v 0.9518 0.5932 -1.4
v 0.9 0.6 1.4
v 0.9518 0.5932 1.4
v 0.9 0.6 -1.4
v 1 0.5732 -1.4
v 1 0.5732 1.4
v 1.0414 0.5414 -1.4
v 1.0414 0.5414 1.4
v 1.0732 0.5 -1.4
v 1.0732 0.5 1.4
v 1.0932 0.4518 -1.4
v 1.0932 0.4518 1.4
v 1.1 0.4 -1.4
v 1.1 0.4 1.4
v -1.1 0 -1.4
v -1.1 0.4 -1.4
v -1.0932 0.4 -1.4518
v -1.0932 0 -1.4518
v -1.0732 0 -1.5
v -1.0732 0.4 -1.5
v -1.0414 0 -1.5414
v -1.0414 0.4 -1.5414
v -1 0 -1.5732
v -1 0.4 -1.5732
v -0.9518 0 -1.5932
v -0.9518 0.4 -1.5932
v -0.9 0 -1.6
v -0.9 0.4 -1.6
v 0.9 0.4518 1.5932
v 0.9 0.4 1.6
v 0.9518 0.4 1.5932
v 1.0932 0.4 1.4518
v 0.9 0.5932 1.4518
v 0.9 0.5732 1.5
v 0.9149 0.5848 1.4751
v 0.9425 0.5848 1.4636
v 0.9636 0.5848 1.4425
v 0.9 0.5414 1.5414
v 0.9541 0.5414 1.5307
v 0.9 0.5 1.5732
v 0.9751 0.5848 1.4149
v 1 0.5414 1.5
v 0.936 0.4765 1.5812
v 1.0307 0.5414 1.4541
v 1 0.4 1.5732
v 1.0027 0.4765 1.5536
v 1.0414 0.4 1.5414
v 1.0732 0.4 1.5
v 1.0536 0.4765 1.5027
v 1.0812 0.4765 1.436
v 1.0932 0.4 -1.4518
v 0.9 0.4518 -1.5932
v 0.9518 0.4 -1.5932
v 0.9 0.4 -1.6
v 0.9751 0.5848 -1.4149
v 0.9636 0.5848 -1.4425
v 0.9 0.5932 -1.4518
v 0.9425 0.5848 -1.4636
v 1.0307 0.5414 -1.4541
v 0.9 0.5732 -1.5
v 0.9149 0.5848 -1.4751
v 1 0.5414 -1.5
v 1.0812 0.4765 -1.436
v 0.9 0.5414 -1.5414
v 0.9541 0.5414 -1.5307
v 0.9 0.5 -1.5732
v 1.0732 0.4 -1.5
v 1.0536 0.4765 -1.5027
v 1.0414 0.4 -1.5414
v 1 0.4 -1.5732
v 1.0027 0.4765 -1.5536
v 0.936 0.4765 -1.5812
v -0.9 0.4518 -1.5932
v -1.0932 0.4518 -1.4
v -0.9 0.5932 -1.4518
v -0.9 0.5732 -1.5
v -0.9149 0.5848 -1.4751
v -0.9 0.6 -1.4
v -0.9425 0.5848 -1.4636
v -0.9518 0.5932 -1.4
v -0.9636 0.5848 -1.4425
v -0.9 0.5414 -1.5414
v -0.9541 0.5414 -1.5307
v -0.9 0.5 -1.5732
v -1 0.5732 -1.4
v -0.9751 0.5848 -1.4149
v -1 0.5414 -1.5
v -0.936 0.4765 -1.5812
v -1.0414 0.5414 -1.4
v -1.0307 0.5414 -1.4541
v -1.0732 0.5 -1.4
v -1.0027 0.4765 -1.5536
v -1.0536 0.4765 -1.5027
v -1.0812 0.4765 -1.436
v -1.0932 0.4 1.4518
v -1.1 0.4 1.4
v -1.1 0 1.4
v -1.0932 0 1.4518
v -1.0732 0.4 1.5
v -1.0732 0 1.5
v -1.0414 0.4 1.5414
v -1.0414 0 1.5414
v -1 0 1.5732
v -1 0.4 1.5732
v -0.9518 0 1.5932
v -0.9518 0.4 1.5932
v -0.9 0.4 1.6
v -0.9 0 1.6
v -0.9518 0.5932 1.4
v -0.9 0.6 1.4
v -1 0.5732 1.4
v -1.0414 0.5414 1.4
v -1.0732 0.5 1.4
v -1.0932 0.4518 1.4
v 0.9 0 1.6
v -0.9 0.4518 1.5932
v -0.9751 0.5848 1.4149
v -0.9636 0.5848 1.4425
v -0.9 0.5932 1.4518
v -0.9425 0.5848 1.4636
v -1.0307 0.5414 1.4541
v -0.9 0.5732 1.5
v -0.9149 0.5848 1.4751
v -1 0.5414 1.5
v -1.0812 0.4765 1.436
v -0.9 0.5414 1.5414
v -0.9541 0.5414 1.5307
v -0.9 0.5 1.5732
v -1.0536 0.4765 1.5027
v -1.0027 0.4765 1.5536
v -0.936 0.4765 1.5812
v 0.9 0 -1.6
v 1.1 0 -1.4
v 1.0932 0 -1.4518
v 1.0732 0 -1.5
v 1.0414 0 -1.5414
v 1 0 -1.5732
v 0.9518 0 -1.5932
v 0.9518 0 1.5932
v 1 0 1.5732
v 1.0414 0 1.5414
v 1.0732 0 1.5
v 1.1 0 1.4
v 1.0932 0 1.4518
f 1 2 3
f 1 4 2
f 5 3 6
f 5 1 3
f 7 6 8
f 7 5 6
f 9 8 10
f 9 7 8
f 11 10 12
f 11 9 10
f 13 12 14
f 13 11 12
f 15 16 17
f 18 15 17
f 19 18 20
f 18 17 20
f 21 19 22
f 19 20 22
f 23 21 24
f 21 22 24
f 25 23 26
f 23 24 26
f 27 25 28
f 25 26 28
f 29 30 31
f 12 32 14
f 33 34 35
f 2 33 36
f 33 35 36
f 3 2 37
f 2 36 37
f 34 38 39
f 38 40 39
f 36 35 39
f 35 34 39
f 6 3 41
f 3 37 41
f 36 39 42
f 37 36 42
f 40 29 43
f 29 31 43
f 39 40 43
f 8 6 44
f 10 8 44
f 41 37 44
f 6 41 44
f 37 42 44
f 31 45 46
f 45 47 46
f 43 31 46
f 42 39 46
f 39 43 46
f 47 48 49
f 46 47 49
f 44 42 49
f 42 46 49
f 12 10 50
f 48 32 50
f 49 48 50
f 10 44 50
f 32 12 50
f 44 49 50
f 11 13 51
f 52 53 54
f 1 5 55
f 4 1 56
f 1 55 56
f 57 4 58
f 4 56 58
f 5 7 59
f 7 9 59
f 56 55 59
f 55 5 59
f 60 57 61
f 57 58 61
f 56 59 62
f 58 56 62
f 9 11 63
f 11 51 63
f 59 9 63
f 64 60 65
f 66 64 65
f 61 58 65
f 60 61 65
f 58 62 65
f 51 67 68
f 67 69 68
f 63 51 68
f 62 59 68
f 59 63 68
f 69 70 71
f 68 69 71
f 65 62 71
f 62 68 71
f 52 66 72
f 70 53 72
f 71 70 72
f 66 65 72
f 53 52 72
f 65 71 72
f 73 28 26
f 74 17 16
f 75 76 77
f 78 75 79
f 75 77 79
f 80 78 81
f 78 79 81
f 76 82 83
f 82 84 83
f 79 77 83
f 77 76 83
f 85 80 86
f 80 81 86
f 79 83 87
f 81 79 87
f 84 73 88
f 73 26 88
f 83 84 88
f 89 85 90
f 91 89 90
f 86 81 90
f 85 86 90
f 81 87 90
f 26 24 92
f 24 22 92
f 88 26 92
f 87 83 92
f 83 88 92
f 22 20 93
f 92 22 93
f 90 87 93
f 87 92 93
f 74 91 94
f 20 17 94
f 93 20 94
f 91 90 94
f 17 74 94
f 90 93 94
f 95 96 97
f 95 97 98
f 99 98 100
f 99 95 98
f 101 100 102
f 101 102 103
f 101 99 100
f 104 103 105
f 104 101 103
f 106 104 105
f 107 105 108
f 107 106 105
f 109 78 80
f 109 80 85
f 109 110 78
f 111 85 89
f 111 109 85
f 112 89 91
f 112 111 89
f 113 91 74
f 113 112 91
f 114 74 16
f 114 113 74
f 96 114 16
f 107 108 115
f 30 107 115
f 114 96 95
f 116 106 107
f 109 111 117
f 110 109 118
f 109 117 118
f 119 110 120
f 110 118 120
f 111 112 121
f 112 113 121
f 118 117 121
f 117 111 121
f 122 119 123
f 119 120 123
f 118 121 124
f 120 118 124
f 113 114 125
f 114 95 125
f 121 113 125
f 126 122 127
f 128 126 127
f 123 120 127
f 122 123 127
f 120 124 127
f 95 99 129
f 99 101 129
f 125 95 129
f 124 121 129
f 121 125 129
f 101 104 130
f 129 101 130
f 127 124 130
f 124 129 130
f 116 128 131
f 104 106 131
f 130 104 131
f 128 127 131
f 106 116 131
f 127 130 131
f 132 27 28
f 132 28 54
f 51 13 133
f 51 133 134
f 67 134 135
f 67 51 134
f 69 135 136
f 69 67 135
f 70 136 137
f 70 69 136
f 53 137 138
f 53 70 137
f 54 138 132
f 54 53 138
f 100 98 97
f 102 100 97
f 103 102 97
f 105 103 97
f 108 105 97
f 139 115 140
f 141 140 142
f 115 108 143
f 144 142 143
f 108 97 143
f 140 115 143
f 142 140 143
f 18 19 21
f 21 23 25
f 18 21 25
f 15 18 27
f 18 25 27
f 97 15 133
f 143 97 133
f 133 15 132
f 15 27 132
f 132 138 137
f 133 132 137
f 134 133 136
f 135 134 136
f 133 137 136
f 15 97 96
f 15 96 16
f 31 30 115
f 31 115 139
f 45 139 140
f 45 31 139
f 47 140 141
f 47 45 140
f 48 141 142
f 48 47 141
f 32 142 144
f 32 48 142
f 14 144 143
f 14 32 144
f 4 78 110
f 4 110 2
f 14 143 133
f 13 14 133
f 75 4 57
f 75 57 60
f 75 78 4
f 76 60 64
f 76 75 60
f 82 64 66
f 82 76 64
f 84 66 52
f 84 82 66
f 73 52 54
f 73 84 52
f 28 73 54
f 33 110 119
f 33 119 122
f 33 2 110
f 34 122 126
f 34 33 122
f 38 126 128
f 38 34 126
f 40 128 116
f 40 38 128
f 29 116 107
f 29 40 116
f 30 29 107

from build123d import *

# Parameters (mm, degrees)
BASES_W    = 2.2
BASES_H    = 3.2
BASE_DEPTH = 0.6
SIDEF_R    = 0.2
TOPF_R     = 0.2


with BuildPart() as part:
    # BaseS → Base (new body)
    with BuildSketch(Plane(origin=(0, 0, 0), x_dir=(1, 0, 0), z_dir=(0, 1, 0))):
        Rectangle(BASES_W, BASES_H)
    extrude(amount=BASE_DEPTH)

    # SideF
    sidef_edges = [part.edges().sort_by_distance(p)[0] for p in [
        (1.1, 0.3, 1.6),
        (-1.1, 0.3, 1.6),
        (-1.1, 0.3, -1.6),
        (1.1, 0.3, -1.6),
    ]]
    fillet(sidef_edges, radius=SIDEF_R)

    # TopF
    topf_edges = [part.edges().sort_by_distance(p)[0] for p in [
        (1.1, 0.6, 0),
        (0, 0.6, 1.6),
        (0, 0.6, -1.6),
        (-1.1, 0.6, 0),
        (-1.041421356, 0.6, -1.541421356),
        (-1.041421356, 0.6, 1.541421356),
        (1.041421356, 0.6, -1.541421356),
        (1.041421356, 0.6, 1.541421356),
    ]]
    fillet(topf_edges, radius=TOPF_R)


solid = part.part
